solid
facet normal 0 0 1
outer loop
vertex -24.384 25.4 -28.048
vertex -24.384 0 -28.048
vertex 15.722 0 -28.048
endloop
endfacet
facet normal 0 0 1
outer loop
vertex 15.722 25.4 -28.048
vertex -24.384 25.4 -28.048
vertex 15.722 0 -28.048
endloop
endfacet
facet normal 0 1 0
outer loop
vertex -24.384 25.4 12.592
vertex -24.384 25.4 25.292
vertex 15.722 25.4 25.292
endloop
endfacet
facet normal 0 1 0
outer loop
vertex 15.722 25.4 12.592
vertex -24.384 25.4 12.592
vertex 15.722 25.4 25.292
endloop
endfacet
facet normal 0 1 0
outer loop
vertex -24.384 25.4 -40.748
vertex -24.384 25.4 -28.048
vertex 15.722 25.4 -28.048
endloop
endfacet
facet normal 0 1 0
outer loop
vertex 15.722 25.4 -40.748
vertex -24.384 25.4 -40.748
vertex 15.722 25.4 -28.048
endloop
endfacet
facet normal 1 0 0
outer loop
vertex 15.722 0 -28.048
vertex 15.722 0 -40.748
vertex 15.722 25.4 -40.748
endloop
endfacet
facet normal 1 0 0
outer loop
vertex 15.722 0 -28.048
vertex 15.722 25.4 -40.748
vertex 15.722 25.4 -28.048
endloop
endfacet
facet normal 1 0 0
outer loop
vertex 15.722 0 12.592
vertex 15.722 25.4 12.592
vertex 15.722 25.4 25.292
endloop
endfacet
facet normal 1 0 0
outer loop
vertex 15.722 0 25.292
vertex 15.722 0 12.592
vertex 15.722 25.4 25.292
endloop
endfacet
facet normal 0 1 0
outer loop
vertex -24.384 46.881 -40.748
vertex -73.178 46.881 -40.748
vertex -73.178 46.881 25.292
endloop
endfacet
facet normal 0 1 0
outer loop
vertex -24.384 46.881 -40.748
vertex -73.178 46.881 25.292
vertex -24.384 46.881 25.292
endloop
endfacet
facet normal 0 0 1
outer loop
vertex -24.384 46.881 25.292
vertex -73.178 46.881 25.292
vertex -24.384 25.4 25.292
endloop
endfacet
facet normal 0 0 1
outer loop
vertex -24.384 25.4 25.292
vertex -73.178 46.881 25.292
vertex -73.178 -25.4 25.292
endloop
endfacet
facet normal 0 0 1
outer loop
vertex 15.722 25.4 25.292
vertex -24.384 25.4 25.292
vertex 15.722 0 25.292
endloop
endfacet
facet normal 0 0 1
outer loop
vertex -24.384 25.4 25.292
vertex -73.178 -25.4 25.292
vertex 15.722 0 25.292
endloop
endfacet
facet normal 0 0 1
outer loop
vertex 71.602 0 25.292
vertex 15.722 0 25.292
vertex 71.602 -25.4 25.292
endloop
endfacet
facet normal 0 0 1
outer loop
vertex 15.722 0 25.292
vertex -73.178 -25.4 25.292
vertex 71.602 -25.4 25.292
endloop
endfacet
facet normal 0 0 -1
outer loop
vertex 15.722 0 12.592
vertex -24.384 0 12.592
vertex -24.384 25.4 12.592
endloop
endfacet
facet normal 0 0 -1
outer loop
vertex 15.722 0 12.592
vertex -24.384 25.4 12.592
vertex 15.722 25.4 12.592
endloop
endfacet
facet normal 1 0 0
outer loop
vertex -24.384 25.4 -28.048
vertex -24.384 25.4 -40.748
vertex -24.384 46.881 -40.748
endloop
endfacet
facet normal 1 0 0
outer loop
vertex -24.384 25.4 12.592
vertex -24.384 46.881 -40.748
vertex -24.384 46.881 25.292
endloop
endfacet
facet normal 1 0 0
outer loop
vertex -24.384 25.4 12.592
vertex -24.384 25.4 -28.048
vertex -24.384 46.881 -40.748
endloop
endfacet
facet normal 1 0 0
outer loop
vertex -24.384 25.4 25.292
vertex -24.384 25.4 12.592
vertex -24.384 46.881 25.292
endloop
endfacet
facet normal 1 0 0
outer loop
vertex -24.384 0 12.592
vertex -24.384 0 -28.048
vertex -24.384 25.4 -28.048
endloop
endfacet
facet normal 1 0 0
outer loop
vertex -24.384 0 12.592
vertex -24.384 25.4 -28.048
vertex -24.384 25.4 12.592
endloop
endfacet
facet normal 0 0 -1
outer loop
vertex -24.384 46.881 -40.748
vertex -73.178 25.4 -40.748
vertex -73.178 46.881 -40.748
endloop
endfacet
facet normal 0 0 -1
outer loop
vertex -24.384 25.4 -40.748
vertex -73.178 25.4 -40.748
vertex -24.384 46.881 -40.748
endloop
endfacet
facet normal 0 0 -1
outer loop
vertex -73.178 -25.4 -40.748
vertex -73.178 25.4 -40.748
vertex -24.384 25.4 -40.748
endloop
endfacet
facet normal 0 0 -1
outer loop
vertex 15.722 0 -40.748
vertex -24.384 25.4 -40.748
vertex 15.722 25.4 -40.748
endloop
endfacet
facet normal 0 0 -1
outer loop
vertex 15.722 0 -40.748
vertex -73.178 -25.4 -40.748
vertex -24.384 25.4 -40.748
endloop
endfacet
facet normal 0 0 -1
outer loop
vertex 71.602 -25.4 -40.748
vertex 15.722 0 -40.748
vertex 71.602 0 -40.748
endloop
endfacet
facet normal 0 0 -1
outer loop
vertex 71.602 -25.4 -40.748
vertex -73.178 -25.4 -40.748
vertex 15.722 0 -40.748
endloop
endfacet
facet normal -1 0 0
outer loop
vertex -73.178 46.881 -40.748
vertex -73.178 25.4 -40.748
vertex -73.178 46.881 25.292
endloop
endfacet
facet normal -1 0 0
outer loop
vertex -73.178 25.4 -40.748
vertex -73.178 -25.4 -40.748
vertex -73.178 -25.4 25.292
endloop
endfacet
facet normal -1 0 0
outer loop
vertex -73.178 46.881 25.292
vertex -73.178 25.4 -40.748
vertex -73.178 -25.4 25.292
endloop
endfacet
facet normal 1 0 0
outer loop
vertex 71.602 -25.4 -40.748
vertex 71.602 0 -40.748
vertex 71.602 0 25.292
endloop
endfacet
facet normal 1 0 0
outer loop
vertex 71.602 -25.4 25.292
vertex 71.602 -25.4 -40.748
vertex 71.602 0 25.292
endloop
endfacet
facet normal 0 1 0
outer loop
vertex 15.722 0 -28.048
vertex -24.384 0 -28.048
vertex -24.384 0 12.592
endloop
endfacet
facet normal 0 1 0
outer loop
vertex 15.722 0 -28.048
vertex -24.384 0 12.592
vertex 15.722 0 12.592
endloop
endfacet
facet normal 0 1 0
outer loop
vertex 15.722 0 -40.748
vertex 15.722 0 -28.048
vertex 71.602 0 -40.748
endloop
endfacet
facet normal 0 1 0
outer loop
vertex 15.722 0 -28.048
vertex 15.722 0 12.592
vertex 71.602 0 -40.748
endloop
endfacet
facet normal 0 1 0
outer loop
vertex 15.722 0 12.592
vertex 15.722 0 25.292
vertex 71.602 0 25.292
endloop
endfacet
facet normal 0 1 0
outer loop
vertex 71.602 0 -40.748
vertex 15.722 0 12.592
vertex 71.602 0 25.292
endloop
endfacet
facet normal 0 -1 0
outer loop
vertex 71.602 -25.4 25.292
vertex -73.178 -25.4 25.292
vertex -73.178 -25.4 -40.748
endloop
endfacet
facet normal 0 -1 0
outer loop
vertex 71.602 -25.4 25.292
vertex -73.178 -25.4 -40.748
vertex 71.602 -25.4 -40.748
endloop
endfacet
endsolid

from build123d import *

# Parameters (mm, degrees)
F0_W     = 144.78
F0_H     = 66.04
F1_DEPTH = 25.4
F2_W     = 88.9
F2_H     = 12.7
F3_DEPTH = 25.4
F4_W     = 48.7939789891
F4_H     = 66.04
F5_DEPTH = 46.88145


with BuildPart() as f1:
    # F0 (on Front) → F1 (new body)
    with BuildSketch(Plane.XZ):
        with Locations((-0.7880558757, -7.7282395214)):
            Rectangle(F0_W, F0_H)
    extrude(amount=F1_DEPTH)

    # F2 (on Front) → F3 (join)
    with BuildSketch(Plane.XZ):
        with Locations((-28.7280558757, -34.3982395214)):
            Rectangle(F2_W, F2_H)
        with Locations((-28.7280558757, 18.9417604786)):
            Rectangle(F2_W, F2_H)
    extrude(amount=-F3_DEPTH)

    # F4 (on Front) → F5 (join)
    with BuildSketch(Plane.XZ):
        with Locations((-48.7810663811, -7.7282395214)):
            Rectangle(F4_W, F4_H)
    extrude(amount=-F5_DEPTH)


solid = f1.part
